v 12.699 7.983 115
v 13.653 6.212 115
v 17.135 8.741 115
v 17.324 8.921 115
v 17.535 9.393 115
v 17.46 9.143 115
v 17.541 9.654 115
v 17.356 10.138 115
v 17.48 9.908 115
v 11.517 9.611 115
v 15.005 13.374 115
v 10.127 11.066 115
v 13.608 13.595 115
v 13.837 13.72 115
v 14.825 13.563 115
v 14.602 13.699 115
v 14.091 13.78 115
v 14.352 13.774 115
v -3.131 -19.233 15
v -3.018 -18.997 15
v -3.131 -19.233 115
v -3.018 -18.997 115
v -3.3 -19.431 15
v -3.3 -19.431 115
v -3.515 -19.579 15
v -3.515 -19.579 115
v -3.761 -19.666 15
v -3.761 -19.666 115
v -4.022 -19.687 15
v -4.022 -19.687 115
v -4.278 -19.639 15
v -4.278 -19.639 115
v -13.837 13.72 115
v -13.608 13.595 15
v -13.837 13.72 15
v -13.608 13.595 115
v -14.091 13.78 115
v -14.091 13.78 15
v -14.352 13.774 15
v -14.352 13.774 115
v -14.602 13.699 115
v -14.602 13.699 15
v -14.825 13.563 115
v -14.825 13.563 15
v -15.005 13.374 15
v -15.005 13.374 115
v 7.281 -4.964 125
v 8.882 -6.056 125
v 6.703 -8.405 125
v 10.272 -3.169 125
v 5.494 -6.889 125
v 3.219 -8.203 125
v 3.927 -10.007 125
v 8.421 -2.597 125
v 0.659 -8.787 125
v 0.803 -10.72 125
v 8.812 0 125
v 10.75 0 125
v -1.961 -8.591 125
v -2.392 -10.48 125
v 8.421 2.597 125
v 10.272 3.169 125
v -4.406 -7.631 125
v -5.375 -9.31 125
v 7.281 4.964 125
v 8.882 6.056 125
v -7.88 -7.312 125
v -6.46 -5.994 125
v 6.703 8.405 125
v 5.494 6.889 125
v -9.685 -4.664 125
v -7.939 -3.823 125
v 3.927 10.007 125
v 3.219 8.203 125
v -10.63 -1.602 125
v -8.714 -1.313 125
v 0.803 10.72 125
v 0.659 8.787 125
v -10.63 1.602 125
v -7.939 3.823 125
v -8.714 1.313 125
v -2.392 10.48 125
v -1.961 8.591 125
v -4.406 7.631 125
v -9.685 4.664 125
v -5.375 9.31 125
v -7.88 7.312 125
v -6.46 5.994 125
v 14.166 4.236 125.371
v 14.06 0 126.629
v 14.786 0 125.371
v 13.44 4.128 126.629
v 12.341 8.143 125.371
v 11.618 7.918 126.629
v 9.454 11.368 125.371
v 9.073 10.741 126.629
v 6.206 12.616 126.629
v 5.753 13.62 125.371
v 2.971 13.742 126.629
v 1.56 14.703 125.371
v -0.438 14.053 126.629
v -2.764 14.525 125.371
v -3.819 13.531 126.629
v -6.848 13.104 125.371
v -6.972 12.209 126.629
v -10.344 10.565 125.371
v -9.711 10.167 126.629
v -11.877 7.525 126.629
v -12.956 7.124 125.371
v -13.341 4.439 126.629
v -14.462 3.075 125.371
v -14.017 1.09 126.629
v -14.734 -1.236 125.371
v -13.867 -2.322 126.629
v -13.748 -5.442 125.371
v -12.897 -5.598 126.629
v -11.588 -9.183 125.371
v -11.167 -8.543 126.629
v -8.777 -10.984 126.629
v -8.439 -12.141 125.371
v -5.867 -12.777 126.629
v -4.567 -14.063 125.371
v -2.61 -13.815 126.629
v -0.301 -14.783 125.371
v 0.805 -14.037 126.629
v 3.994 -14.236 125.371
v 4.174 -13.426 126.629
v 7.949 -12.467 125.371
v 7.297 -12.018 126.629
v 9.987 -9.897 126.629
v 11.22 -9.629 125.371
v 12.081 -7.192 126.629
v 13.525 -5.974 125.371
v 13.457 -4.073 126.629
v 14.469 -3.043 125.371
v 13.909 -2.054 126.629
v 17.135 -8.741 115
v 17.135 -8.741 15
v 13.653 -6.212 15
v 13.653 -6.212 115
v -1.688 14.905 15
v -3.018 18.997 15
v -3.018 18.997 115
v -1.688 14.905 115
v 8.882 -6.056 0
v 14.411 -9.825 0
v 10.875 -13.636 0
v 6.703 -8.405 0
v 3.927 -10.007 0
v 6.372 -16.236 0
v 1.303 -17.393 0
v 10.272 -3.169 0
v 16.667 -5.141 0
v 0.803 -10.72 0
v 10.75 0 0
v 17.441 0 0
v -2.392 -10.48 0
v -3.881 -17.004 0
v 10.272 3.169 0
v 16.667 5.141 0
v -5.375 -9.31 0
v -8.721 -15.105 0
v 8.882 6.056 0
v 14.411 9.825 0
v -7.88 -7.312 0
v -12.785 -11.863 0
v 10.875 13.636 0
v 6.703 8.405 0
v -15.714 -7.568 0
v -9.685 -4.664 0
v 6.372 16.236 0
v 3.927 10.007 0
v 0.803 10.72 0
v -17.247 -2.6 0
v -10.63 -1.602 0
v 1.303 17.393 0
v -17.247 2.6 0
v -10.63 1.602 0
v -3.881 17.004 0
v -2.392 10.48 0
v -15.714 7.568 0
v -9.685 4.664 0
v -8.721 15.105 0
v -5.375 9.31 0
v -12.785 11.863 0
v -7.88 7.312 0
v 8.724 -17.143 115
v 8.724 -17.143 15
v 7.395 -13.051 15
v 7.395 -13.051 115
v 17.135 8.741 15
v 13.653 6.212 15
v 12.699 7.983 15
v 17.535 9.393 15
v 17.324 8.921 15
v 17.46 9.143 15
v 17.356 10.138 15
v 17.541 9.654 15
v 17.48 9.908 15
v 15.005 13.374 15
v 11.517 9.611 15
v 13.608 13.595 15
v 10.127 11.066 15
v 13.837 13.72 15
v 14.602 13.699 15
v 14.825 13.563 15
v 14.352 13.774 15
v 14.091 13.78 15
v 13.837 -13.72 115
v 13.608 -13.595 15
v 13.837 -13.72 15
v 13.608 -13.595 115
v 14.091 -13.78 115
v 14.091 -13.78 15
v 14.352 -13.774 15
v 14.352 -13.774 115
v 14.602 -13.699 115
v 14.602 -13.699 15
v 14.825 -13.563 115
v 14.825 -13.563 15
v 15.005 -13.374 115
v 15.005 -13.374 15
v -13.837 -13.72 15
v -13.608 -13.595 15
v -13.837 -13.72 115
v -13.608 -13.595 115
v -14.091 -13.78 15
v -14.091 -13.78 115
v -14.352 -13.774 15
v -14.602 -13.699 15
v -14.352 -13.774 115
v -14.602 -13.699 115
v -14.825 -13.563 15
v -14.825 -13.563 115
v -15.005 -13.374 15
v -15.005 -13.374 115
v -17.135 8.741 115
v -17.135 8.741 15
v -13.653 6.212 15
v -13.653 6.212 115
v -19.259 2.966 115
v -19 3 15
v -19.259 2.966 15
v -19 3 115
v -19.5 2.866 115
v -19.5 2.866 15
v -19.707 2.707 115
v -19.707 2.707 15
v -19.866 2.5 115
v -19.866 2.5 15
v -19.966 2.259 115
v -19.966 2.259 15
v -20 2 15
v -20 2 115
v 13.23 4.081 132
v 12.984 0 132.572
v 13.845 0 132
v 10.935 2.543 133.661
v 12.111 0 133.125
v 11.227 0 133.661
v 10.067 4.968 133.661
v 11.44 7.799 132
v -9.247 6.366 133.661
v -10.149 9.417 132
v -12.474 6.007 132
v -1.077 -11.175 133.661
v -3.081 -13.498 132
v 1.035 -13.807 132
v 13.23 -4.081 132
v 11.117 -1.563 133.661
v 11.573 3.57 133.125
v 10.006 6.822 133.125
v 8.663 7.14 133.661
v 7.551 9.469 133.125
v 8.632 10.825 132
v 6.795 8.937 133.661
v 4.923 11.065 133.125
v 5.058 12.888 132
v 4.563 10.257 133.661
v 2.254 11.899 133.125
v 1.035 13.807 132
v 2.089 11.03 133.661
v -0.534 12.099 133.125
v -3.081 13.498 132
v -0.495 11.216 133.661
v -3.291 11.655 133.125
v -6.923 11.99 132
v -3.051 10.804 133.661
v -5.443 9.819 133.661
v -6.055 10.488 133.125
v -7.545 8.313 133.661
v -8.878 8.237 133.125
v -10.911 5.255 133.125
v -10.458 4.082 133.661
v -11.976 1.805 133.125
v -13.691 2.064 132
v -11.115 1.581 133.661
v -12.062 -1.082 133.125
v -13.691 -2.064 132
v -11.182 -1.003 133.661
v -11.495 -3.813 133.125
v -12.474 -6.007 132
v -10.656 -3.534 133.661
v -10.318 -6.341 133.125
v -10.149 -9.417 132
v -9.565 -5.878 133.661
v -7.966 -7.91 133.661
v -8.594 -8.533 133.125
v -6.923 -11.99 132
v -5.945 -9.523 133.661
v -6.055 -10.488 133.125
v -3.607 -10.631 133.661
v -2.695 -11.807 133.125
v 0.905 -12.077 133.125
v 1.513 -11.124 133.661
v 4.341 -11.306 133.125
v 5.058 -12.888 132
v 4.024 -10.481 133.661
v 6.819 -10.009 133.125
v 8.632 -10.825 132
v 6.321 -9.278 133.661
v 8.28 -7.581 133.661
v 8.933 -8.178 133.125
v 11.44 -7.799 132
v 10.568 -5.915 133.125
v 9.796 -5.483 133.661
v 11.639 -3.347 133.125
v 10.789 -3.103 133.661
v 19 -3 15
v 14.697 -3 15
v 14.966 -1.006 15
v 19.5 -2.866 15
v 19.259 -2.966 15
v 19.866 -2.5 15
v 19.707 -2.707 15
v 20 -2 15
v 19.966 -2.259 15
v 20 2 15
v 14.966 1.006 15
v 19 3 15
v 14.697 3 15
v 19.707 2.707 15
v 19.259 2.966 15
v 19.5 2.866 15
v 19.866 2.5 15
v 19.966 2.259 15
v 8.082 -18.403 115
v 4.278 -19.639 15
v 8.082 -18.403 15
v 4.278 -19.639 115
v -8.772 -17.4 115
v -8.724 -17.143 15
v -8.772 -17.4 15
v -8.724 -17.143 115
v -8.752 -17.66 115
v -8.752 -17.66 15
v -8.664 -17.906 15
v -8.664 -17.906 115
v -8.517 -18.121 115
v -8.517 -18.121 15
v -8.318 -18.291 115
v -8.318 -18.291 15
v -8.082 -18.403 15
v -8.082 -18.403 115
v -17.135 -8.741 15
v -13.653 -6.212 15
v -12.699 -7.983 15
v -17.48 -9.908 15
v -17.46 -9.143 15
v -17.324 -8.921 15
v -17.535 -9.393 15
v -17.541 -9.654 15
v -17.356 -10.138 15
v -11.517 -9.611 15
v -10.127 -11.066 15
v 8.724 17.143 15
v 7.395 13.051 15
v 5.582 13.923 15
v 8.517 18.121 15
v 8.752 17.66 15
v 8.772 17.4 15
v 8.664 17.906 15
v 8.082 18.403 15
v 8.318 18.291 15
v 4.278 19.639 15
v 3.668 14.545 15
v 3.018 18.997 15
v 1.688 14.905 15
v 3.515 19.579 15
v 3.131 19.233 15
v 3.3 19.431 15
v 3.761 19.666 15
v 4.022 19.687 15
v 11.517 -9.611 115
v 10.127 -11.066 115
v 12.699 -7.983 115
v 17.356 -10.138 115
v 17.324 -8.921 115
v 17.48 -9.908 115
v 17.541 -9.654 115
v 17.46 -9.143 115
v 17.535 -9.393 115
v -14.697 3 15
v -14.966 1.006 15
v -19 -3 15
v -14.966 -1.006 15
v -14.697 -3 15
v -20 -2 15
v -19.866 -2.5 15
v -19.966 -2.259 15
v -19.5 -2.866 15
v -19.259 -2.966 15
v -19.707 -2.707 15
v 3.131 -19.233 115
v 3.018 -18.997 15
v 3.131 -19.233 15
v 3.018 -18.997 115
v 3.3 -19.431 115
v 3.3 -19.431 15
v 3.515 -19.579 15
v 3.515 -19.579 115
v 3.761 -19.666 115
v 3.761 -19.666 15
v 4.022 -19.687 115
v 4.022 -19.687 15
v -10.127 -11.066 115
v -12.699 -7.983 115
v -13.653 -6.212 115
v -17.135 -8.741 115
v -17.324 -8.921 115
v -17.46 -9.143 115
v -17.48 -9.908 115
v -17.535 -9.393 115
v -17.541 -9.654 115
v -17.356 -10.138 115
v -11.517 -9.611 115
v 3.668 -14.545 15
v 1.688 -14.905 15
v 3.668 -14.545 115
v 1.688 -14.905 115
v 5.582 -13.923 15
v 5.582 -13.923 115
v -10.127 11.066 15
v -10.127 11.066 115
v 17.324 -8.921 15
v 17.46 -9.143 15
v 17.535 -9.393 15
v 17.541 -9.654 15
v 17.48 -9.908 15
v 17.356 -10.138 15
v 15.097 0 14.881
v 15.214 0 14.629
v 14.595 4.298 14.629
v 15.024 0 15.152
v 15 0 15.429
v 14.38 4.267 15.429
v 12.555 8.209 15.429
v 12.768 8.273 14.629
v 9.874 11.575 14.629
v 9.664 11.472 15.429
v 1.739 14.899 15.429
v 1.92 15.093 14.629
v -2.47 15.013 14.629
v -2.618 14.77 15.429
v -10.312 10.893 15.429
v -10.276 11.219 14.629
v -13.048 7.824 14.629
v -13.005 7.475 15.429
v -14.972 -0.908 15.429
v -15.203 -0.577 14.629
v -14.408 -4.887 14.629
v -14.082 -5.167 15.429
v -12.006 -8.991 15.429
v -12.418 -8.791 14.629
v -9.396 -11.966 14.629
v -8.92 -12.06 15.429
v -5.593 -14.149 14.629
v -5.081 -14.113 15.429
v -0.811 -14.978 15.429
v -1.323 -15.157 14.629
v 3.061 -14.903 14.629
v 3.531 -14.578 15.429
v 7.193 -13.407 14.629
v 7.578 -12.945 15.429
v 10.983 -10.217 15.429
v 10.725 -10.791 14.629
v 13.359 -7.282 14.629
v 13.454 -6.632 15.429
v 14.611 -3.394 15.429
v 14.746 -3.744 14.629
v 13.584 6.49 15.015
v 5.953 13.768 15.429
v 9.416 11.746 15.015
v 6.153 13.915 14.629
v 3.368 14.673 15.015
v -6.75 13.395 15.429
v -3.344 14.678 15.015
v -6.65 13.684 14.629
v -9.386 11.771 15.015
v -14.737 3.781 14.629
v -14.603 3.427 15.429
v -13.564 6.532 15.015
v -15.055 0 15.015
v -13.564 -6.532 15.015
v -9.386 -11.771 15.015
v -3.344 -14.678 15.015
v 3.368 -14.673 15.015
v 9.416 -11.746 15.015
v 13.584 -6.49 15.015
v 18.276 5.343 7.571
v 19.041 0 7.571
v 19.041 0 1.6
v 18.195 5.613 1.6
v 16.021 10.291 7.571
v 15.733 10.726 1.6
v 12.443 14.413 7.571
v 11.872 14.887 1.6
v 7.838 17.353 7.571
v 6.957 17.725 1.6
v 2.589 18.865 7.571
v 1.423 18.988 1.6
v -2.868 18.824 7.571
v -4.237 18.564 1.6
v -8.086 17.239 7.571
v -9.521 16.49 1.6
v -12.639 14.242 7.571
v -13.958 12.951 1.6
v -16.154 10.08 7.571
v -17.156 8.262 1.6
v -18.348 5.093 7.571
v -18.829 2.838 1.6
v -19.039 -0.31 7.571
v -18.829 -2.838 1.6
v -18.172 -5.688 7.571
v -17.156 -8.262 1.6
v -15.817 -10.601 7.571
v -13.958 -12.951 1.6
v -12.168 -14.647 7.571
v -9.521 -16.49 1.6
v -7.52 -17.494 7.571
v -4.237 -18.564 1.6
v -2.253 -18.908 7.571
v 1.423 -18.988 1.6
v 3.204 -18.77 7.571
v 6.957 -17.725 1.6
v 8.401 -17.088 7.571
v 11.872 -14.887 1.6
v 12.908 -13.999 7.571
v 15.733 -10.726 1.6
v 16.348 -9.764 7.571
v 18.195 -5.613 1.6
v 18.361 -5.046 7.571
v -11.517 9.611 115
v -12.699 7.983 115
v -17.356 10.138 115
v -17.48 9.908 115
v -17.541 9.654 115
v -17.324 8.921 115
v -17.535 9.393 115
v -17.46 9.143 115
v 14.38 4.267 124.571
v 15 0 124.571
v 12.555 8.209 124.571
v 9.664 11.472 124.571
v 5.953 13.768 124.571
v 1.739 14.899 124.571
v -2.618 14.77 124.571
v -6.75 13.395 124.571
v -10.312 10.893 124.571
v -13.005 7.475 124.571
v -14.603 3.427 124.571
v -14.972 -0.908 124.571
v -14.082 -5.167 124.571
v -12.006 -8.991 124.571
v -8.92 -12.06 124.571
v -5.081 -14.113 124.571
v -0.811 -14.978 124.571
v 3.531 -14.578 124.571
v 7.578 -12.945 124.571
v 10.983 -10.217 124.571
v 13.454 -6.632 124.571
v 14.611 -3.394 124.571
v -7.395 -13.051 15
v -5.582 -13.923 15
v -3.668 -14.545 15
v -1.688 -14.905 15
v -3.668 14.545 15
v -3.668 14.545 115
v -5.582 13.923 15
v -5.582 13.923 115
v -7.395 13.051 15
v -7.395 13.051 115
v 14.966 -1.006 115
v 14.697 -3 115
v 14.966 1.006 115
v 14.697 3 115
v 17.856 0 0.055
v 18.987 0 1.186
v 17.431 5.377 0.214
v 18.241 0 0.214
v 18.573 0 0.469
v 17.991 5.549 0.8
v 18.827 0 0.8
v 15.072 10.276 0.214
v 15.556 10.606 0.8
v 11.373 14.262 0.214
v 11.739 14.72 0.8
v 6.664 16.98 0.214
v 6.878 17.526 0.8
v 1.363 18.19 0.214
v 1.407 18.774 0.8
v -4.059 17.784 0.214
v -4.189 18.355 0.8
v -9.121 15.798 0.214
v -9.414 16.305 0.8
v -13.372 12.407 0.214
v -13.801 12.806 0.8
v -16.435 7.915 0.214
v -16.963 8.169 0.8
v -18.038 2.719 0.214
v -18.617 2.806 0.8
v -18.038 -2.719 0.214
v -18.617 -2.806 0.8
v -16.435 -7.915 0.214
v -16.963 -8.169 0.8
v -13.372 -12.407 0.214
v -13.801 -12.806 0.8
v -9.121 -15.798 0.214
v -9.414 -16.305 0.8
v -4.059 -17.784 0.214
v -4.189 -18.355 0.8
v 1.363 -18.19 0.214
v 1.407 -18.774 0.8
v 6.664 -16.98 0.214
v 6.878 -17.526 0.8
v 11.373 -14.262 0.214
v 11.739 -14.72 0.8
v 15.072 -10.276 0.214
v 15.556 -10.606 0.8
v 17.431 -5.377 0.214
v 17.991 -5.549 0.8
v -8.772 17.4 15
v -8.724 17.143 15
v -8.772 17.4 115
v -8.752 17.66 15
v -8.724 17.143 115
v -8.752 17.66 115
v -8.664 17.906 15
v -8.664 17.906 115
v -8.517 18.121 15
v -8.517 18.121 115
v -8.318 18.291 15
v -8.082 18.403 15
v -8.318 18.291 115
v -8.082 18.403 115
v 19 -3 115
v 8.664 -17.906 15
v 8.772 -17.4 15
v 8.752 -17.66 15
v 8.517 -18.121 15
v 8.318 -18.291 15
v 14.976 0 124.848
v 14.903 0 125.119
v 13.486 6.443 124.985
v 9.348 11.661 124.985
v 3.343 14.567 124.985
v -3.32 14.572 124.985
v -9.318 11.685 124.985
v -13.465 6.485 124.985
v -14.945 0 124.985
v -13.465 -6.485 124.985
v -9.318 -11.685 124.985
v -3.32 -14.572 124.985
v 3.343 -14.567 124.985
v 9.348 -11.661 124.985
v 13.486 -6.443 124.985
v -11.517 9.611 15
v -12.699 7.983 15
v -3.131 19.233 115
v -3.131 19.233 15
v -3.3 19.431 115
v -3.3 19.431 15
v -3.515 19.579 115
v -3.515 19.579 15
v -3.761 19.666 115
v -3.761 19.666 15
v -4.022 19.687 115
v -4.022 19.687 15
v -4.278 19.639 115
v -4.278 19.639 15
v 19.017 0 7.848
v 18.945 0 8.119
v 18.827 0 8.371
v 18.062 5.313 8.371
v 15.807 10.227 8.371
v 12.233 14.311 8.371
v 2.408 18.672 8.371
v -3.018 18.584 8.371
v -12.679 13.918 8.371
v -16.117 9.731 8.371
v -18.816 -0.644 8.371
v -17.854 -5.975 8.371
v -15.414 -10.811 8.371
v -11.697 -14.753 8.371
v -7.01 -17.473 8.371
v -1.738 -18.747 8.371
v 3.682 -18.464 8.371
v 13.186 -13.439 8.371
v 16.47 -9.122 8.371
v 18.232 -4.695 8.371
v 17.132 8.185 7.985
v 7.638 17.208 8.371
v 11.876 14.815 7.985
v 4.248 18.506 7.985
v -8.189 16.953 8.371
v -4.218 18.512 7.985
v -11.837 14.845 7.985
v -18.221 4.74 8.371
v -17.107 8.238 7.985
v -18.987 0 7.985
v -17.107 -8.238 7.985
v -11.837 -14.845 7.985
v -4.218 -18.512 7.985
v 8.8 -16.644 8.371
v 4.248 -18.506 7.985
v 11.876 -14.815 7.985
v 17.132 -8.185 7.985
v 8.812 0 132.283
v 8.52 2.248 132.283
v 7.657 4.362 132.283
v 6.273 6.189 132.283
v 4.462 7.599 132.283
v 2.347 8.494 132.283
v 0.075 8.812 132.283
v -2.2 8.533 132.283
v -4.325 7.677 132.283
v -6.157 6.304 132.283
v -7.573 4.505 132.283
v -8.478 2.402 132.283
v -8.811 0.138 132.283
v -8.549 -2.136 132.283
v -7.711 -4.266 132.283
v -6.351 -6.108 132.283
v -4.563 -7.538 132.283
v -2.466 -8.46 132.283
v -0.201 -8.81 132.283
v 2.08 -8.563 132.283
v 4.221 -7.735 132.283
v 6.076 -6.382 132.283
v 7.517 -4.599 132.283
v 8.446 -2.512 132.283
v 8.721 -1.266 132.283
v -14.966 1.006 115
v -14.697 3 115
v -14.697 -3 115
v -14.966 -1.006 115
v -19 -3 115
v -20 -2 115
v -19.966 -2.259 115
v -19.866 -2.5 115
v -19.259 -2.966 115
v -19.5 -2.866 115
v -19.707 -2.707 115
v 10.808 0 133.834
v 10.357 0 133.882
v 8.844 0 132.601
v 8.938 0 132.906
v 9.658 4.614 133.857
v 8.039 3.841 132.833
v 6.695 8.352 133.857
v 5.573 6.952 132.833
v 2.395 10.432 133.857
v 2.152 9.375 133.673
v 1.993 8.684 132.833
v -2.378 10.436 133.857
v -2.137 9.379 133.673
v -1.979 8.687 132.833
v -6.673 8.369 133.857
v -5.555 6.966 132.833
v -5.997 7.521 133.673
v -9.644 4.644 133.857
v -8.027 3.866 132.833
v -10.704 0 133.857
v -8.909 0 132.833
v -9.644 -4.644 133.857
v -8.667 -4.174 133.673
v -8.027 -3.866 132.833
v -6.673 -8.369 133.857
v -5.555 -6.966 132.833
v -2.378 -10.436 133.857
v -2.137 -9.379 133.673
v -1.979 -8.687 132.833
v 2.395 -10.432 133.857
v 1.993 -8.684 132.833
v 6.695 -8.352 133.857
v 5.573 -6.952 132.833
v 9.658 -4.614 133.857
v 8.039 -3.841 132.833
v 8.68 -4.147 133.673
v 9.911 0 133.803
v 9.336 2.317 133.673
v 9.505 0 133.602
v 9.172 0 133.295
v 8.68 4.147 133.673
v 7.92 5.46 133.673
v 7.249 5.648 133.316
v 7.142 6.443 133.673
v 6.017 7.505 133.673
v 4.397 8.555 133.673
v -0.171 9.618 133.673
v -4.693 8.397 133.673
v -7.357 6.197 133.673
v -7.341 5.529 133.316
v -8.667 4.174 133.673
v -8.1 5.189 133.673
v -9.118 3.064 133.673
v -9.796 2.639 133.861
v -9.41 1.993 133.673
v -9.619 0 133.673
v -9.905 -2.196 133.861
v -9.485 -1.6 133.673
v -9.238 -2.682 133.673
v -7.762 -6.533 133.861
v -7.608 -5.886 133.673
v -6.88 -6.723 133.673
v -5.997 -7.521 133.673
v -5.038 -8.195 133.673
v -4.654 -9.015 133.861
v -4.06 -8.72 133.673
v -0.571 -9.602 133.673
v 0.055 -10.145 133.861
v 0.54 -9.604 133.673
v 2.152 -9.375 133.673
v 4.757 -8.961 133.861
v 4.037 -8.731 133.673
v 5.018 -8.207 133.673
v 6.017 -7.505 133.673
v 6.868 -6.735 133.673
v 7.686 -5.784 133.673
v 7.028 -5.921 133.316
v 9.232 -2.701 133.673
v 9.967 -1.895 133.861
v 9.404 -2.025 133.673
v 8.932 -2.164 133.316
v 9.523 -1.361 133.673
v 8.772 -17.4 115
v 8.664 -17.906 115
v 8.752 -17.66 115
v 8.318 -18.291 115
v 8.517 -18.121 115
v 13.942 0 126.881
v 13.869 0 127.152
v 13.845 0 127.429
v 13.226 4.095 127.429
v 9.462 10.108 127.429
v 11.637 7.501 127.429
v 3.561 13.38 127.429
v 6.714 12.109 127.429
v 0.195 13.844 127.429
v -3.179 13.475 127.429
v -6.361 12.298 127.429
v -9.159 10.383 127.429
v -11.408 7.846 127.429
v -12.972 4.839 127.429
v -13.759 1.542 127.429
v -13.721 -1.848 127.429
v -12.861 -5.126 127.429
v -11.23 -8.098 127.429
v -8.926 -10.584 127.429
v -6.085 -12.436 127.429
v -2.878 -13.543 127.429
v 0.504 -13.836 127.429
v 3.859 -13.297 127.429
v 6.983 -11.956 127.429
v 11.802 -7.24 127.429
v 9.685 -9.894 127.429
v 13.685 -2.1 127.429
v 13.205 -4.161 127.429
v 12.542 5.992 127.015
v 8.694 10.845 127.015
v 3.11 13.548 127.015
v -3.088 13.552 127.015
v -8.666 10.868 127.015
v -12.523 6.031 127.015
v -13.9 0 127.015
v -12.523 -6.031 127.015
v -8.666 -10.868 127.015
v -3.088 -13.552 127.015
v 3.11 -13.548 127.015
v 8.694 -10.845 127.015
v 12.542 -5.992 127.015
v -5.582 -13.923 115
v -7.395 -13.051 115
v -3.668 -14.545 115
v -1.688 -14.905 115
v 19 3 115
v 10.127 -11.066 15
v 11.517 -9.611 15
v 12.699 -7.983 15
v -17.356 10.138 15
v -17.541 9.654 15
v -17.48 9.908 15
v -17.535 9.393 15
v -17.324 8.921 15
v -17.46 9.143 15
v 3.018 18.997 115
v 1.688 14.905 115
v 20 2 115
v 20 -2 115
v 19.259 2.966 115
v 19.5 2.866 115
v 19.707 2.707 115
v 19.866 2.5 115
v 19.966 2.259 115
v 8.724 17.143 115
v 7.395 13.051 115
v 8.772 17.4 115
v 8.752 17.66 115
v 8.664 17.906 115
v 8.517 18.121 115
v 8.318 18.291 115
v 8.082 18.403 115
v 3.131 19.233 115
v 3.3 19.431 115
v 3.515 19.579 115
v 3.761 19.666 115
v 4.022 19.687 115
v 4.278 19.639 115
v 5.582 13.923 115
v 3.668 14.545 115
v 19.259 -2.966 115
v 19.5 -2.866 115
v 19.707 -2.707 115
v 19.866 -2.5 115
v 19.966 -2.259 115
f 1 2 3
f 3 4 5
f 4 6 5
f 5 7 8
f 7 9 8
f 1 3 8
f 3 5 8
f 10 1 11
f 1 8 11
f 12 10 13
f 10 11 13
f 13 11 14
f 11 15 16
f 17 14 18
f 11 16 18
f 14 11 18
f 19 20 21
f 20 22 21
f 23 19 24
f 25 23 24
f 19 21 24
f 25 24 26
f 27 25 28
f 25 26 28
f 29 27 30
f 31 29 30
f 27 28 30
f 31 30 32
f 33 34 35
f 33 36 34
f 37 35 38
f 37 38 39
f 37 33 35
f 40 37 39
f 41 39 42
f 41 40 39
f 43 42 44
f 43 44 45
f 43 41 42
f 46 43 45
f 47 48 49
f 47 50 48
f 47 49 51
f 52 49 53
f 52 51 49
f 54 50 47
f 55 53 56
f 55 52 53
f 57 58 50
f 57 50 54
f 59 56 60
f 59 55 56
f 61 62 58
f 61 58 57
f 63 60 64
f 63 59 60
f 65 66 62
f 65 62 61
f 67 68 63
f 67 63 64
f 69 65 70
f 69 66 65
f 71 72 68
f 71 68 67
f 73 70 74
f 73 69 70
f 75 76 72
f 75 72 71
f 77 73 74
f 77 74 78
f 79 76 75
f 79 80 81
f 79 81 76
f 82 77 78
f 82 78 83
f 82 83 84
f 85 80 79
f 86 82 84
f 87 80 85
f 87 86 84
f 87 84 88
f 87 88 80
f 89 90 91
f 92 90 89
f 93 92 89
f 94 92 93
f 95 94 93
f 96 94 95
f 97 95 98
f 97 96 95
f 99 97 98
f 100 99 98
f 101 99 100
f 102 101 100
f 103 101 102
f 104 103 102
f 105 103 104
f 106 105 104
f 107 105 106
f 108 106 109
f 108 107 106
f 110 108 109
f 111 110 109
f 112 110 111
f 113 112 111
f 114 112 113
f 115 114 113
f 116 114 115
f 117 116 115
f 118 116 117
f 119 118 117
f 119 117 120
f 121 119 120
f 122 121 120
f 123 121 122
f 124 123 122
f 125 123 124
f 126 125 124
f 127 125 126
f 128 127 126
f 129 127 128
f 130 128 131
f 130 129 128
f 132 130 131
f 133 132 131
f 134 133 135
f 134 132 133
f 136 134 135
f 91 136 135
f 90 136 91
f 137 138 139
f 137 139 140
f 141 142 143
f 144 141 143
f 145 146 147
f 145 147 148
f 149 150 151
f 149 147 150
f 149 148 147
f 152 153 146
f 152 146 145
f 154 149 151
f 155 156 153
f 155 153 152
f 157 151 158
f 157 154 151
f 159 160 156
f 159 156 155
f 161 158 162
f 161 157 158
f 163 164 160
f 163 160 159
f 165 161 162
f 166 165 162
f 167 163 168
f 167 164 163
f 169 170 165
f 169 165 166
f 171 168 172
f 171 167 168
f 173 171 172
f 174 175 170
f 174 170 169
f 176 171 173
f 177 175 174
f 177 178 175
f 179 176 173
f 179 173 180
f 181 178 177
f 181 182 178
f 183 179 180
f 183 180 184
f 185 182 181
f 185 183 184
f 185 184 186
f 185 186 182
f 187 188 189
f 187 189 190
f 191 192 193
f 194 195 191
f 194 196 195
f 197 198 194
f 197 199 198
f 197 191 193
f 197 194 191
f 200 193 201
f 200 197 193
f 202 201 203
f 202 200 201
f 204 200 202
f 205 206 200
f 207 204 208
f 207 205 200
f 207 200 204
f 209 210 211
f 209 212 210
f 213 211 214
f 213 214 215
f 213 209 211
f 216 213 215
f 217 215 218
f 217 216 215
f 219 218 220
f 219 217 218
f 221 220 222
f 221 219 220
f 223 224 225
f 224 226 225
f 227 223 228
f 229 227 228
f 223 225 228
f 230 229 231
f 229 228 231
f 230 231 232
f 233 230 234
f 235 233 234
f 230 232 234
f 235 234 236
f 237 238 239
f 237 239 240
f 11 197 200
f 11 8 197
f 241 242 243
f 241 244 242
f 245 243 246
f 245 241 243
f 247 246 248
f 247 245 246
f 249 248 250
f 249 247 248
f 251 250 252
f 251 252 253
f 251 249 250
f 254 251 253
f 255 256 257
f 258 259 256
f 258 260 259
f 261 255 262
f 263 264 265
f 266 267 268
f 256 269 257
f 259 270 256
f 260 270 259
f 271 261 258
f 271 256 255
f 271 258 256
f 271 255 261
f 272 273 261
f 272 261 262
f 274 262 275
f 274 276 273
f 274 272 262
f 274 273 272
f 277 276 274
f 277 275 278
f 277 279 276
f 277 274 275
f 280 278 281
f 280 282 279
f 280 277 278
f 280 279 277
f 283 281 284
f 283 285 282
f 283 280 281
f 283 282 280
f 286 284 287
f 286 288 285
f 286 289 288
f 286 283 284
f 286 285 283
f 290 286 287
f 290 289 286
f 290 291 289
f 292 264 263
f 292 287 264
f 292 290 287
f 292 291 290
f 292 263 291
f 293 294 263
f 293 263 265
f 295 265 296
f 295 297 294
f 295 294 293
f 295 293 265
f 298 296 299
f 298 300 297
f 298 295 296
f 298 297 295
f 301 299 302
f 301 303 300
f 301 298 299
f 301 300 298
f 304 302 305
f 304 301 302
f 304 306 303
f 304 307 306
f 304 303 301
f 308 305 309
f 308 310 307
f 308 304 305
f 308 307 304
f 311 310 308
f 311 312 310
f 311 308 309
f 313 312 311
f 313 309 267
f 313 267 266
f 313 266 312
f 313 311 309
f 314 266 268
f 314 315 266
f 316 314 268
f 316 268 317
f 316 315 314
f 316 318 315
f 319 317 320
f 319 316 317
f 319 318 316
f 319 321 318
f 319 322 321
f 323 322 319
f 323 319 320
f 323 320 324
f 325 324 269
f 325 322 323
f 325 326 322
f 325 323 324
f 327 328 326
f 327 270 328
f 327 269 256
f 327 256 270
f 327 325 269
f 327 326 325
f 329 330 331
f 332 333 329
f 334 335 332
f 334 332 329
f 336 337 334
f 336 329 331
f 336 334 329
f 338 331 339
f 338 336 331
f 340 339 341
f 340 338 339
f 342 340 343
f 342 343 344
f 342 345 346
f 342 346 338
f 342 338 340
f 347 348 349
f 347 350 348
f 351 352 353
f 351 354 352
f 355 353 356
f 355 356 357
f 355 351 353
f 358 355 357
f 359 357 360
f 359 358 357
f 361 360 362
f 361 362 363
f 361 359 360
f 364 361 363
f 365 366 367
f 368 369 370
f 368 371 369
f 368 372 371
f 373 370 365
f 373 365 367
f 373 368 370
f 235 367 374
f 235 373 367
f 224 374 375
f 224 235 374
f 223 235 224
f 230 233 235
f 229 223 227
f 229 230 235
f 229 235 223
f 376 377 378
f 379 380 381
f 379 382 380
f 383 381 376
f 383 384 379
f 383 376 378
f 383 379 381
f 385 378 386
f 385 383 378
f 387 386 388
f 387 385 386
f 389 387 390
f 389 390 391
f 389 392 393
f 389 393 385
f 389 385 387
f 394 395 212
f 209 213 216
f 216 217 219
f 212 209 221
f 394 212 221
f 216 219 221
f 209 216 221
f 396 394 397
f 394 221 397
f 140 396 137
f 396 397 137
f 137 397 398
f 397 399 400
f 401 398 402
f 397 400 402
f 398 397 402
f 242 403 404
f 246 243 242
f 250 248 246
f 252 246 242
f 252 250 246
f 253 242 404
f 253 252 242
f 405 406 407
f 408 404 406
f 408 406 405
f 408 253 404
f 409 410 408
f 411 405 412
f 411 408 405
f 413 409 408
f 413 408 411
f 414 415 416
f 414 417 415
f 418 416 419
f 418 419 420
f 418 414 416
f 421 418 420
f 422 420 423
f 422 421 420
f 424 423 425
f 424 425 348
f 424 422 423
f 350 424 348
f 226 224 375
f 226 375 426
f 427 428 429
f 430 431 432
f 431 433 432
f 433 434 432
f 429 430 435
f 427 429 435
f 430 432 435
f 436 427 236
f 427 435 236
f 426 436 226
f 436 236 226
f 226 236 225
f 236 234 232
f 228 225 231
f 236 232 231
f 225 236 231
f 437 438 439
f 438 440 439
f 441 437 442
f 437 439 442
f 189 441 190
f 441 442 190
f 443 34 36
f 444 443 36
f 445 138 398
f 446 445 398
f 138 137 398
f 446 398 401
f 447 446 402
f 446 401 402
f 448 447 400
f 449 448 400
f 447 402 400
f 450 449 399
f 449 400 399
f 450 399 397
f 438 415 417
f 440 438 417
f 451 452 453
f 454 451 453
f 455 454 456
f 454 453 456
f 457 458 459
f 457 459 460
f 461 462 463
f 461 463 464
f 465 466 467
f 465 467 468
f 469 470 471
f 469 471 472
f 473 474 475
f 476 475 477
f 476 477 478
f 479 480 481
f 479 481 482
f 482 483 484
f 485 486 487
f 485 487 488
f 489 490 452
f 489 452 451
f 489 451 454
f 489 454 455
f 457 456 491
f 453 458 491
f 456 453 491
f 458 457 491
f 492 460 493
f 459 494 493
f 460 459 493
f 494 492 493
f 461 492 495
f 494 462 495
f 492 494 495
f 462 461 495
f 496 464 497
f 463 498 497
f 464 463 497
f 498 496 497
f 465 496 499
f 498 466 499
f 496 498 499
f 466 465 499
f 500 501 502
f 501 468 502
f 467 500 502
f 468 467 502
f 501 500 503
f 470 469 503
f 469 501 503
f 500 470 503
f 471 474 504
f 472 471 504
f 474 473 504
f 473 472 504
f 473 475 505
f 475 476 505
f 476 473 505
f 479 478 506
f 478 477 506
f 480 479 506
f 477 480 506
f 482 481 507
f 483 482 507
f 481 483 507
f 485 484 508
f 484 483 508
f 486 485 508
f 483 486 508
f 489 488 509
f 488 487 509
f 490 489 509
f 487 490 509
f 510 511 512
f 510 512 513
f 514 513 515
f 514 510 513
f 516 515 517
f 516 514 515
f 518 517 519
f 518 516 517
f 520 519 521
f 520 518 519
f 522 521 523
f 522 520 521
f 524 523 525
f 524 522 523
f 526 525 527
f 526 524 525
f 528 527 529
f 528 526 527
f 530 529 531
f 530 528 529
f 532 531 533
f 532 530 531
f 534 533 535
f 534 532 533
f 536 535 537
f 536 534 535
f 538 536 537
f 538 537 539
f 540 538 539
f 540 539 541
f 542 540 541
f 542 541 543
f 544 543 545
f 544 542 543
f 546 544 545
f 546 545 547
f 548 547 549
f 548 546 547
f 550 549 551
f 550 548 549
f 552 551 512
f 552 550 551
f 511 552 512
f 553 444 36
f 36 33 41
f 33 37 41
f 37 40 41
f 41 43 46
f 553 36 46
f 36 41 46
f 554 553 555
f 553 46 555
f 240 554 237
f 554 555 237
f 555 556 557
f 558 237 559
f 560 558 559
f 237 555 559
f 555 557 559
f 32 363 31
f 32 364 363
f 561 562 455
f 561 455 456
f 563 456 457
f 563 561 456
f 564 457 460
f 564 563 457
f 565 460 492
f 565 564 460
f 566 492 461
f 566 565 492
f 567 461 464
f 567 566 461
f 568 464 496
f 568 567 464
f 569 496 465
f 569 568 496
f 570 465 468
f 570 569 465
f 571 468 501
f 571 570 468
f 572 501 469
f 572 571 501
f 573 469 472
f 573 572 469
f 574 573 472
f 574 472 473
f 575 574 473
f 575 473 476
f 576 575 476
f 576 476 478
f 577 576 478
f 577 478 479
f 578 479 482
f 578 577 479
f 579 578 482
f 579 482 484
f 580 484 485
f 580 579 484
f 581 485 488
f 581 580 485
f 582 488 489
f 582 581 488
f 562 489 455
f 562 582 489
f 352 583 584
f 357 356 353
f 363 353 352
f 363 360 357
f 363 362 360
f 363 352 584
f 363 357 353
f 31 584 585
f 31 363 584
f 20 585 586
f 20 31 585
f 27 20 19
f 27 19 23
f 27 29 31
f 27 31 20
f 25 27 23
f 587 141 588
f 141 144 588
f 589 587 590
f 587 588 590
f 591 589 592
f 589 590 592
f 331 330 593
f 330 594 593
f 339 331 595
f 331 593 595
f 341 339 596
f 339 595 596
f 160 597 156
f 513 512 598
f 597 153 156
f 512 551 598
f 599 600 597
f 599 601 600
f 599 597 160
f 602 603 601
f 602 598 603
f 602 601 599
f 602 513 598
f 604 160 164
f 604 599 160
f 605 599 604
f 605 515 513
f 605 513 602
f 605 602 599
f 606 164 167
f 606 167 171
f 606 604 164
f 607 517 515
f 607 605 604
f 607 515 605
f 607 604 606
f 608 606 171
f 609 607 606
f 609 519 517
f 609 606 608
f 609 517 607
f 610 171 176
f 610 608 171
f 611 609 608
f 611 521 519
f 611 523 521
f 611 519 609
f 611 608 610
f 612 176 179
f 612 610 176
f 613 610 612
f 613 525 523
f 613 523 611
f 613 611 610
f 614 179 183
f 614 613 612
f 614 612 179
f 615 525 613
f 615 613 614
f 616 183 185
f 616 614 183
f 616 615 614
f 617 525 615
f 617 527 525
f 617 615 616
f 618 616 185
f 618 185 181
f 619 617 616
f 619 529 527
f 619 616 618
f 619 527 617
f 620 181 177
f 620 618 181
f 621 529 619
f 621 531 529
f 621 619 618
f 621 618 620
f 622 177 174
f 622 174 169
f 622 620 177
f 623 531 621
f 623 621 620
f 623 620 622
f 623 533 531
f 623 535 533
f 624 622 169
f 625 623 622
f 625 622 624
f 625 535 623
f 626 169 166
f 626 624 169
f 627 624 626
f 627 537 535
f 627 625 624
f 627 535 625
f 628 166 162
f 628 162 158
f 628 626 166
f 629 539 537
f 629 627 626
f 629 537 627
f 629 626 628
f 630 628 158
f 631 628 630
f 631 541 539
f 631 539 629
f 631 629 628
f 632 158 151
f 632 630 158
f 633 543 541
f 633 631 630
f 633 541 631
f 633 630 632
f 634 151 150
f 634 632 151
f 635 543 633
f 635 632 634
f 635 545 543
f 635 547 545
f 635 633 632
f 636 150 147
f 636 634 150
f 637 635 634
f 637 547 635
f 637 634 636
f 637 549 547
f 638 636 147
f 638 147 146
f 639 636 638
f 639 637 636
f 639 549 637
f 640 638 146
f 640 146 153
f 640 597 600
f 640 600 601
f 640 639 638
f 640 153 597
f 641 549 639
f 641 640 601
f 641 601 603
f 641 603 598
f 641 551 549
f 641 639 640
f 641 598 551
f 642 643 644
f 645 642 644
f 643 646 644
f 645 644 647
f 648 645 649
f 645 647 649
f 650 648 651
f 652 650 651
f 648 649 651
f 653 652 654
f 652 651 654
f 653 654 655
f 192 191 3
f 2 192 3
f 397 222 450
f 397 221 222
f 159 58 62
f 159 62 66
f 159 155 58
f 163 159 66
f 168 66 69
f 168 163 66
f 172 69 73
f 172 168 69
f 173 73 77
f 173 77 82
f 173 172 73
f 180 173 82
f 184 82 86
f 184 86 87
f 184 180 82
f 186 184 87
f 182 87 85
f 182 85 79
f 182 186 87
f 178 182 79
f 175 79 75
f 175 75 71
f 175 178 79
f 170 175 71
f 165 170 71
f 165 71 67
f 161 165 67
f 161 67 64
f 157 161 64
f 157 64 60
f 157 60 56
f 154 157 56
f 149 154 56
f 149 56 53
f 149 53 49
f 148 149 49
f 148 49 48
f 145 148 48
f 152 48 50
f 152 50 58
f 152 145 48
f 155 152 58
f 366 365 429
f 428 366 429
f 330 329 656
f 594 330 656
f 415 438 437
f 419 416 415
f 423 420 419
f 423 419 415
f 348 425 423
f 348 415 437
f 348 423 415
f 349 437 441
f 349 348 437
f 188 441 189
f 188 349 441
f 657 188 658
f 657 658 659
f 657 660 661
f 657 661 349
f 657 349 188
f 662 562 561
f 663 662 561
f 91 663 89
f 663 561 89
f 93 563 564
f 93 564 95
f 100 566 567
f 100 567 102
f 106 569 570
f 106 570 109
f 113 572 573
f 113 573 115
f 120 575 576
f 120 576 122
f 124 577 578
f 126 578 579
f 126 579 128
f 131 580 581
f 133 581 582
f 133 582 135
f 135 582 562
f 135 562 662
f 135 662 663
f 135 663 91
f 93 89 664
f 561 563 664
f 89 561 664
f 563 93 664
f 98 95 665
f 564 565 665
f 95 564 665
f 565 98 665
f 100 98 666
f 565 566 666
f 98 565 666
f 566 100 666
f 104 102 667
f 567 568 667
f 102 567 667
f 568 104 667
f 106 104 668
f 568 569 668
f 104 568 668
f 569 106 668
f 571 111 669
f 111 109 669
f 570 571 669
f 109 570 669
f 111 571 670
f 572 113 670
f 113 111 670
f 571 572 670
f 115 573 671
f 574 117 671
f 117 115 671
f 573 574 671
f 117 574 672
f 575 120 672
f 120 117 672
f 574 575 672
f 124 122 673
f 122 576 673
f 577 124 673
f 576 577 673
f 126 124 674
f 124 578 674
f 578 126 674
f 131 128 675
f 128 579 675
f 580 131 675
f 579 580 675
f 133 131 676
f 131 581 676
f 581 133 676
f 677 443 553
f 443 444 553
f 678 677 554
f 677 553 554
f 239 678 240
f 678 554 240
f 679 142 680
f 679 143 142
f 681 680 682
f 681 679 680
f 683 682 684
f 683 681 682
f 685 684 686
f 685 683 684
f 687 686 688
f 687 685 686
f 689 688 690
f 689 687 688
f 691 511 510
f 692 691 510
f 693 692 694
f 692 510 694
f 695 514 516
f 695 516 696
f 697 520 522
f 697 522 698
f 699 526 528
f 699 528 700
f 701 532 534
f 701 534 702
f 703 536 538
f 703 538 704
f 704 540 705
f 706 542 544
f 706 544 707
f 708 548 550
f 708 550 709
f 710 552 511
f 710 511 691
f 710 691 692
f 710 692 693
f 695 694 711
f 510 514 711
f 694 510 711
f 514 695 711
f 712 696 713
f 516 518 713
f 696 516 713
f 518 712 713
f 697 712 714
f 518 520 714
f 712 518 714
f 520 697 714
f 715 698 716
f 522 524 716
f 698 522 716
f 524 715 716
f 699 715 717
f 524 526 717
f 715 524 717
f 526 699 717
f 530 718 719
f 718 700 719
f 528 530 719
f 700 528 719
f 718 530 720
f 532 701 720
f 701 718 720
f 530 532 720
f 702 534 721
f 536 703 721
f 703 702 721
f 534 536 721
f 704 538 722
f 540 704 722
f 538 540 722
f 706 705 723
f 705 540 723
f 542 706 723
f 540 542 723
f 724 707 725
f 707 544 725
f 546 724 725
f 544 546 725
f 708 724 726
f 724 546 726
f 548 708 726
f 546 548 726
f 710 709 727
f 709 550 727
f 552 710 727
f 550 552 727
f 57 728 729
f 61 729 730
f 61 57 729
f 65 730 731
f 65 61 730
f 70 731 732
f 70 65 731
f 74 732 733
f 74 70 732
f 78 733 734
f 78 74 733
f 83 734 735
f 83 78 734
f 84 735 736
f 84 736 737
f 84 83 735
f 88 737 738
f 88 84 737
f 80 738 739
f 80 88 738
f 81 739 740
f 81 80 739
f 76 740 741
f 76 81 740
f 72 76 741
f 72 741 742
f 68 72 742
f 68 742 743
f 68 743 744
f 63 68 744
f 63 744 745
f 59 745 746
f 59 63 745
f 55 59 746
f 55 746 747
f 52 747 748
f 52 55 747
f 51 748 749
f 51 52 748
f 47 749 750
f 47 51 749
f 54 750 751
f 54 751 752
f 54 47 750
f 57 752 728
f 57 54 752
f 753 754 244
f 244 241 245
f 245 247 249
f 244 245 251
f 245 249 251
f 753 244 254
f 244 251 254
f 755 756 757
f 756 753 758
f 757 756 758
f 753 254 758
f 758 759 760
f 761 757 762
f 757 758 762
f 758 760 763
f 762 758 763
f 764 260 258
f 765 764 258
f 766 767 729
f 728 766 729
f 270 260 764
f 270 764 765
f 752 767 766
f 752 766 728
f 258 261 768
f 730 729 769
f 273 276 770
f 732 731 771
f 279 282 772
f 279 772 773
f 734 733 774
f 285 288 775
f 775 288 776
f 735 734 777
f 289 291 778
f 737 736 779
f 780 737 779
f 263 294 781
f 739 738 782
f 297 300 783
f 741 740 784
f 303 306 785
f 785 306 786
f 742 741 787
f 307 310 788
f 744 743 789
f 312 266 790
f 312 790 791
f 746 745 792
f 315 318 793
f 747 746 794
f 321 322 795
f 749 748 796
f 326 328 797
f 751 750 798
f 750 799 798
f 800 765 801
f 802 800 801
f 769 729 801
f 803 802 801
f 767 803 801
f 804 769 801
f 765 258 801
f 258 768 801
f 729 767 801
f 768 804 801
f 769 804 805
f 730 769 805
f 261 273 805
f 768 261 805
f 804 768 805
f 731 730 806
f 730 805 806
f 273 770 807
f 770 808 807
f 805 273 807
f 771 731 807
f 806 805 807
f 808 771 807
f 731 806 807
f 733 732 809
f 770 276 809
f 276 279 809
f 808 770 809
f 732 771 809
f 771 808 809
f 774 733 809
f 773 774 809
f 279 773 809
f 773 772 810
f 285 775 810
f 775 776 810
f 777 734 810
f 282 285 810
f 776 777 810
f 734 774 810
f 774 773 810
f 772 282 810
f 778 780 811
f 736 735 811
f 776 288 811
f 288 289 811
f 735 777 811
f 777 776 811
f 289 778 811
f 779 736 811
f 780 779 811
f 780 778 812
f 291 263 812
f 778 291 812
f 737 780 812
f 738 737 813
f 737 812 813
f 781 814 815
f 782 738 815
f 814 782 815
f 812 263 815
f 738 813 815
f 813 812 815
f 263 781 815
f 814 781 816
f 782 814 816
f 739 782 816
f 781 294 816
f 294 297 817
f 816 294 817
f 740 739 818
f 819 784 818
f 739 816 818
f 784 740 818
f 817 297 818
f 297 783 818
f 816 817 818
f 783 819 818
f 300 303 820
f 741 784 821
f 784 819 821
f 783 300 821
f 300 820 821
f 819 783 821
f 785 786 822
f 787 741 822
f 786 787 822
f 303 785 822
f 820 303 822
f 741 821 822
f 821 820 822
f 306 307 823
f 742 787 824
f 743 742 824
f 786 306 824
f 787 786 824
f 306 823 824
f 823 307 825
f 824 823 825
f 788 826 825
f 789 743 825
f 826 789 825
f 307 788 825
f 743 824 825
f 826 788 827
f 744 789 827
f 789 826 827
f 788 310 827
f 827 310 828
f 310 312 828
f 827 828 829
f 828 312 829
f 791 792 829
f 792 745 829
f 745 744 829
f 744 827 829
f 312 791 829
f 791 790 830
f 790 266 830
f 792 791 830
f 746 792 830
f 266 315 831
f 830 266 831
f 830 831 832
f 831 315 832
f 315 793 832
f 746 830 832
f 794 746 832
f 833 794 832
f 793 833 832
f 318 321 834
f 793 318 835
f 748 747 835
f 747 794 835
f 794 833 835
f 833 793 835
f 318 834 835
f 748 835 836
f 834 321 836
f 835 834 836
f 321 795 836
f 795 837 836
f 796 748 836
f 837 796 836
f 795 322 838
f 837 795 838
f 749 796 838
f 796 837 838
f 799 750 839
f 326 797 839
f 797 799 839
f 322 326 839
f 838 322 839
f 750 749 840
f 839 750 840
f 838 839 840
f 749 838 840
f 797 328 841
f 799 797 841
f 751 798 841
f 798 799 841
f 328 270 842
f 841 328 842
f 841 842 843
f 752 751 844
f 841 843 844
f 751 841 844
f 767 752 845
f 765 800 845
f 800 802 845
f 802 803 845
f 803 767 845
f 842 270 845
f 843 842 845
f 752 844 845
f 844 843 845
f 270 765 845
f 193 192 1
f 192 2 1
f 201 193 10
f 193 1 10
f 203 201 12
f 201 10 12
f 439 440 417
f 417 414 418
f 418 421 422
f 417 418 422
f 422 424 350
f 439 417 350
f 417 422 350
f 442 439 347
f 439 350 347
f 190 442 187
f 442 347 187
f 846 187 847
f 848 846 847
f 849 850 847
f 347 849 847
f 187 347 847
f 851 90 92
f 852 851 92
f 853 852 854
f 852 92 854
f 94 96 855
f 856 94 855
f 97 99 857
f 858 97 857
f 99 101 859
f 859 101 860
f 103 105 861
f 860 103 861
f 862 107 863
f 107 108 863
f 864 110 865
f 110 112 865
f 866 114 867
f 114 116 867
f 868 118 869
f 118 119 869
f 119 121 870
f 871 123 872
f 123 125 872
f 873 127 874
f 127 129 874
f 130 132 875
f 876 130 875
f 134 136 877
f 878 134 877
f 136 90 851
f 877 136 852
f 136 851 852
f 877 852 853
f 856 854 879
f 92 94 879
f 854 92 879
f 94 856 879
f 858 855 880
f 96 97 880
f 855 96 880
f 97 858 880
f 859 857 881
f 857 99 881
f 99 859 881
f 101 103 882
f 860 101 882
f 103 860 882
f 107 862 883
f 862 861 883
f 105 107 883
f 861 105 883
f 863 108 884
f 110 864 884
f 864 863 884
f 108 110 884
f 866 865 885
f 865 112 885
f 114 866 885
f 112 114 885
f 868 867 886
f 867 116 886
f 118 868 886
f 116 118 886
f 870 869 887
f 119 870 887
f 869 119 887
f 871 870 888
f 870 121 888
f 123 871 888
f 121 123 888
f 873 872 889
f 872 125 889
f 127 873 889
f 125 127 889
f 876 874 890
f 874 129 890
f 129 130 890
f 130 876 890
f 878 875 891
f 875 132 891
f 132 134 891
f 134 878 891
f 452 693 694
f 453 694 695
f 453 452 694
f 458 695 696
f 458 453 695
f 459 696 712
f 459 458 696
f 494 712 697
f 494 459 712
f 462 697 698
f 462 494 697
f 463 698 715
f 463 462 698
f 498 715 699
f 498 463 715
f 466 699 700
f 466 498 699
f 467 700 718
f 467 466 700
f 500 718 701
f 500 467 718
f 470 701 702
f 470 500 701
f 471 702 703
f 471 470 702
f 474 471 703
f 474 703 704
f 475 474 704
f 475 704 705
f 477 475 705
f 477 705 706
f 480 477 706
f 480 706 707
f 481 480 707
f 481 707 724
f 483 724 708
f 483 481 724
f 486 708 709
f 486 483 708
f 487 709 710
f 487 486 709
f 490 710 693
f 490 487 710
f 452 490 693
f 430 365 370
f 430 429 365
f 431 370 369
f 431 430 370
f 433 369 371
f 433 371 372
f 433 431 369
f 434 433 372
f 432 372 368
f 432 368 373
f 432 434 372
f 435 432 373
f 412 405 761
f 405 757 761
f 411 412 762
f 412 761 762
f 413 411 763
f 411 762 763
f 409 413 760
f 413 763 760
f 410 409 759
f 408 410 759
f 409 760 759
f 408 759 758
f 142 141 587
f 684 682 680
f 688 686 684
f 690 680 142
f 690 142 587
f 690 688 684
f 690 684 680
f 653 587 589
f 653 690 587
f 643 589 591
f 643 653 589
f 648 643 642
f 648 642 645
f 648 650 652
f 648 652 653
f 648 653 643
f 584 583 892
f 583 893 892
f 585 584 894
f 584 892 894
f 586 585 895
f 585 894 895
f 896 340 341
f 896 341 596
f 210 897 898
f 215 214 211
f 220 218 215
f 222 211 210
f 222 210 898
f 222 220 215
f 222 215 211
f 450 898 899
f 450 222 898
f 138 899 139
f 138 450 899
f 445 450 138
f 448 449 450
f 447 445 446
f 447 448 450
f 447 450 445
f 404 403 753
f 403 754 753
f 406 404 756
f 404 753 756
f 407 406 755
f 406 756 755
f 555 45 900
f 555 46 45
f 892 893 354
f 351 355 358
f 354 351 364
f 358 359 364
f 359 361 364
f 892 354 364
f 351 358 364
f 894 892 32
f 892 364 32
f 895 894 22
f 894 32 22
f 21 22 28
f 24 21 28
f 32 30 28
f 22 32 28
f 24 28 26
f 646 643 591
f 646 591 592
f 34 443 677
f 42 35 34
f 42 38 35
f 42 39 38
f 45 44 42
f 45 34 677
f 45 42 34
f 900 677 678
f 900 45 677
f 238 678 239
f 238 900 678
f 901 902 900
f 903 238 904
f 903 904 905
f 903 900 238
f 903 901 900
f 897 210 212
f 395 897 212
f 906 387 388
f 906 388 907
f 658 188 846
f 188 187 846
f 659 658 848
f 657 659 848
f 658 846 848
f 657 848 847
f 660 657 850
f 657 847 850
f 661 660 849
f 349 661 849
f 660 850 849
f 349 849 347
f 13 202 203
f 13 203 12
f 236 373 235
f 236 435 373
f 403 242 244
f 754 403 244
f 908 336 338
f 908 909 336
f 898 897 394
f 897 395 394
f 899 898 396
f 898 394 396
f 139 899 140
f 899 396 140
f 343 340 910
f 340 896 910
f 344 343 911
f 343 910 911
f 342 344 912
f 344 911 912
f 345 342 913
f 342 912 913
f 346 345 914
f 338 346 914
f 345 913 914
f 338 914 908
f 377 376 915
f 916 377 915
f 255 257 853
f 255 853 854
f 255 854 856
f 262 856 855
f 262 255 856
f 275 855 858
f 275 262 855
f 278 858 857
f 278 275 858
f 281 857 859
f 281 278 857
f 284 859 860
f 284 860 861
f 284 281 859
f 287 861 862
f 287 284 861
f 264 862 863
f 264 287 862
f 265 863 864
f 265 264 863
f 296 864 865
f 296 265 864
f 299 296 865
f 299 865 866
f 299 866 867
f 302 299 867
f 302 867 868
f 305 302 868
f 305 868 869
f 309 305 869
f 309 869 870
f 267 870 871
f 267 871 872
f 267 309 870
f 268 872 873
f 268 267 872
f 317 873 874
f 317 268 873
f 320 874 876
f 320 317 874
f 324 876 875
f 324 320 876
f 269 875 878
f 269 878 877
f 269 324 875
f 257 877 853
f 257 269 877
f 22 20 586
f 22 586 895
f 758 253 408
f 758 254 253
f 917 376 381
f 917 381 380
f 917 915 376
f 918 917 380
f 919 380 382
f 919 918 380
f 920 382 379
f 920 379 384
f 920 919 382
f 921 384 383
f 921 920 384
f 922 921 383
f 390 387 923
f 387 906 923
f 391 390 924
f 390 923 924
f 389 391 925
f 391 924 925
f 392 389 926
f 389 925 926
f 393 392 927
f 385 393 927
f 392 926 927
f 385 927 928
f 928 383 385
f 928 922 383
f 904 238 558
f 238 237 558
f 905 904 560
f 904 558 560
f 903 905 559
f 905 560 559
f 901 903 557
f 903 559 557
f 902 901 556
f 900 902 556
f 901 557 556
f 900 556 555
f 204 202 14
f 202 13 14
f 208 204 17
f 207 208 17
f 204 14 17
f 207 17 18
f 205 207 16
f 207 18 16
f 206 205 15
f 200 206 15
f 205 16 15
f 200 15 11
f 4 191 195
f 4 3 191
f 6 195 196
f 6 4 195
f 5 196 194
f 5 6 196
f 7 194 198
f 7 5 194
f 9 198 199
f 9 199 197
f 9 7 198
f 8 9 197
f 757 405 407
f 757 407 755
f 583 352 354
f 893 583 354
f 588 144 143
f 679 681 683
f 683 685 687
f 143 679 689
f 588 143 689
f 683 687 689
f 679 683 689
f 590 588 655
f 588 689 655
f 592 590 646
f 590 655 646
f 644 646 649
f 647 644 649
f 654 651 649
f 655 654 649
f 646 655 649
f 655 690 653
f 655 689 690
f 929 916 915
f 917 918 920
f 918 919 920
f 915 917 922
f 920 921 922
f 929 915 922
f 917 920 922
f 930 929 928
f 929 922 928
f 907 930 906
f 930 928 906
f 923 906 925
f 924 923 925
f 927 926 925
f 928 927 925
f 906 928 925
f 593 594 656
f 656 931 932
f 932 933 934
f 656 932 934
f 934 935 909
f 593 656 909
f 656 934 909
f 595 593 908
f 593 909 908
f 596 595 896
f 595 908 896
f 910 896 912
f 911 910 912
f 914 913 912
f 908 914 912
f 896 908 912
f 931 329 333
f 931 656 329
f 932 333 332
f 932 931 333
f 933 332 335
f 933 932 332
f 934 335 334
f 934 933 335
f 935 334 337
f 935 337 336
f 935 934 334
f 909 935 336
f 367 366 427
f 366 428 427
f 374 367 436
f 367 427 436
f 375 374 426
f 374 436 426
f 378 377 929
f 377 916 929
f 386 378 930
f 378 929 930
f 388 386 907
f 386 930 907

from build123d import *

# Parameters (mm, degrees)
F2_R            = 1.6
F5_END_RADIUS   = 15
F4_W            = 6
F4_H            = 100
F5_REACH        = 139.2222902753
F5_COPIES_COUNT = 10
F6_R            = 1
F6_2_R          = 1
F6_3_R          = 1
F6_4_R          = 1
F6_5_R          = 1
F6_6_R          = 1
F6_7_R          = 1
F6_8_R          = 1
F6_9_R          = 1
F6_10_R         = 1


# Not quite as in the source:
# - a feature of the source that left no trace in its solid (it failed there, or was rolled back) is left out
# - a pattern or mirror of a feature is missing from the dataset's text; its kind, count and spacing are read off the source's solid


with BuildPart() as f1:
    # F0 (on Front) → F1 (revolve)
    with BuildSketch(Plane.XZ):
        with BuildLine():
            Line((10.75, 125), (10.75, 0))
            Line((10.75, 0), (19.0414518843, 0))
            Line((19.0414518843, 0), (19.0414518843, 8))
            Line((19.0414518843, 8), (15, 15))
            Line((15, 15), (15, 125))
            Line((15, 125), (13.8452994616, 127))
            Line((13.8452994616, 127), (13.8452994616, 132))
            ThreePointArc((13.8452994616, 132), (11.3726339997, 133.5737953324), (8.812, 135))
            Line((8.812, 135), (8.812, 125))
            Line((8.812, 125), (10.75, 125))
        make_face()
    revolve(axis=Axis((0, 0, 17.9382504751), (0, 0, 1)))

    # F2
    f2_edges = [f1.edges().sort_by_distance(p)[0] for p in [
        (-8.812, 0, 135),
        (-13.845299, 0, 127),
        (-15, 0, 125),
        (-15, 0, 15),
        (-19.041452, 0, 8),
        (-19.041452, 0, 0),
    ]]
    fillet(f2_edges, radius=F2_R)


with BuildPart() as f5:
    f5_end = (Plane.XY.offset(70.0000000001) * Cylinder(F5_END_RADIUS, 567.0645927536, mode=Mode.PRIVATE)).faces().sort_by_distance((-15, 0, 70.0000000001))[0]
    # F4 (on offset) → F5 (new body, up to the whole of a round face its end follows)
    with BuildSketch(Plane.YZ.offset(20)):
        with Locations((0, 65)):
            Rectangle(F4_W, F4_H)
    f5_long = extrude(amount=-F5_REACH, mode=Mode.PRIVATE)
    add(split(f5_long, bisect_by=f5_end, keep=Keep.ALL, mode=Mode.PRIVATE).solids().sort_by_distance((20, 0, 65))[0])


with BuildPart() as f5_copies_1:
    # F5_copies: instance of F5
    add(f5.part.rotate(Axis((0, 0, 0), (0, 0, 1)), 1 * 360 / F5_COPIES_COUNT))

    # F6#2
    f6_2_edges = [f5_copies_1.edges().sort_by_distance(p)[0] for p in [
        (17.943696, 9.328654, 65),
        (14.416984, 14.182756, 65),
    ]]
    fillet(f6_2_edges, radius=F6_2_R)


with BuildPart() as f5_copies_2:
    # F5_copies: instance of F5
    add(f5.part.rotate(Axis((0, 0, 0), (0, 0, 1)), 2 * 360 / F5_COPIES_COUNT))

    # F6#3
    f6_3_edges = [f5_copies_2.edges().sort_by_distance(p)[0] for p in [
        (9.033509, 18.094079, 65),
        (3.32717, 19.948181, 65),
    ]]
    fillet(f6_3_edges, radius=F6_3_R)


with BuildPart() as f5_copies_3:
    # F5_copies: instance of F5
    add(f5.part.rotate(Axis((0, 0, 0), (0, 0, 1)), 3 * 360 / F5_COPIES_COUNT))

    # F6#4
    f6_4_edges = [f5_copies_3.edges().sort_by_distance(p)[0] for p in [
        (-3.32717, 19.948181, 65),
        (-9.033509, 18.094079, 65),
    ]]
    fillet(f6_4_edges, radius=F6_4_R)


with BuildPart() as f5_copies_4:
    # F5_copies: instance of F5
    add(f5.part.rotate(Axis((0, 0, 0), (0, 0, 1)), 4 * 360 / F5_COPIES_COUNT))

    # F6#5
    f6_5_edges = [f5_copies_4.edges().sort_by_distance(p)[0] for p in [
        (-14.416984, 14.182756, 65),
        (-17.943696, 9.328654, 65),
    ]]
    fillet(f6_5_edges, radius=F6_5_R)


with BuildPart() as f5_copies_5:
    # F5_copies: instance of F5
    add(f5.part.rotate(Axis((0, 0, 0), (0, 0, 1)), 5 * 360 / F5_COPIES_COUNT))

    # F6#6
    f6_6_edges = [f5_copies_5.edges().sort_by_distance(p)[0] for p in [
        (-20, 3, 65),
        (-20, -3, 65),
    ]]
    fillet(f6_6_edges, radius=F6_6_R)


with BuildPart() as f5_copies_6:
    # F5_copies: instance of F5
    add(f5.part.rotate(Axis((0, 0, 0), (0, 0, 1)), 6 * 360 / F5_COPIES_COUNT))

    # F6#7
    f6_7_edges = [f5_copies_6.edges().sort_by_distance(p)[0] for p in [
        (-17.943696, -9.328654, 65),
        (-14.416984, -14.182756, 65),
    ]]
    fillet(f6_7_edges, radius=F6_7_R)


with BuildPart() as f5_copies_7:
    # F5_copies: instance of F5
    add(f5.part.rotate(Axis((0, 0, 0), (0, 0, 1)), 7 * 360 / F5_COPIES_COUNT))

    # F6#8
    f6_8_edges = [f5_copies_7.edges().sort_by_distance(p)[0] for p in [
        (-9.033509, -18.094079, 65),
        (-3.32717, -19.948181, 65),
    ]]
    fillet(f6_8_edges, radius=F6_8_R)


with BuildPart() as f5_copies_8:
    # F5_copies: instance of F5
    add(f5.part.rotate(Axis((0, 0, 0), (0, 0, 1)), 8 * 360 / F5_COPIES_COUNT))

    # F6#9
    f6_9_edges = [f5_copies_8.edges().sort_by_distance(p)[0] for p in [
        (3.32717, -19.948181, 65),
        (9.033509, -18.094079, 65),
    ]]
    fillet(f6_9_edges, radius=F6_9_R)


with BuildPart() as f5_copies_9:
    # F5_copies: instance of F5
    add(f5.part.rotate(Axis((0, 0, 0), (0, 0, 1)), 9 * 360 / F5_COPIES_COUNT))

    # F6#10
    f6_10_edges = [f5_copies_9.edges().sort_by_distance(p)[0] for p in [
        (14.416984, -14.182756, 65),
        (17.943696, -9.328654, 65),
    ]]
    fillet(f6_10_edges, radius=F6_10_R)


with BuildPart() as f5_1:
    add(f5.part)

    # F6
    f6_edges = [f5_1.edges().sort_by_distance(p)[0] for p in [
        (20, -3, 65),
        (20, 3, 65),
    ]]
    fillet(f6_edges, radius=F6_R)


solid = Compound([f1.part, f5_copies_1.part, f5_copies_2.part, f5_copies_3.part, f5_copies_4.part, f5_copies_5.part, f5_copies_6.part, f5_copies_7.part, f5_copies_8.part, f5_copies_9.part, f5_1.part])
